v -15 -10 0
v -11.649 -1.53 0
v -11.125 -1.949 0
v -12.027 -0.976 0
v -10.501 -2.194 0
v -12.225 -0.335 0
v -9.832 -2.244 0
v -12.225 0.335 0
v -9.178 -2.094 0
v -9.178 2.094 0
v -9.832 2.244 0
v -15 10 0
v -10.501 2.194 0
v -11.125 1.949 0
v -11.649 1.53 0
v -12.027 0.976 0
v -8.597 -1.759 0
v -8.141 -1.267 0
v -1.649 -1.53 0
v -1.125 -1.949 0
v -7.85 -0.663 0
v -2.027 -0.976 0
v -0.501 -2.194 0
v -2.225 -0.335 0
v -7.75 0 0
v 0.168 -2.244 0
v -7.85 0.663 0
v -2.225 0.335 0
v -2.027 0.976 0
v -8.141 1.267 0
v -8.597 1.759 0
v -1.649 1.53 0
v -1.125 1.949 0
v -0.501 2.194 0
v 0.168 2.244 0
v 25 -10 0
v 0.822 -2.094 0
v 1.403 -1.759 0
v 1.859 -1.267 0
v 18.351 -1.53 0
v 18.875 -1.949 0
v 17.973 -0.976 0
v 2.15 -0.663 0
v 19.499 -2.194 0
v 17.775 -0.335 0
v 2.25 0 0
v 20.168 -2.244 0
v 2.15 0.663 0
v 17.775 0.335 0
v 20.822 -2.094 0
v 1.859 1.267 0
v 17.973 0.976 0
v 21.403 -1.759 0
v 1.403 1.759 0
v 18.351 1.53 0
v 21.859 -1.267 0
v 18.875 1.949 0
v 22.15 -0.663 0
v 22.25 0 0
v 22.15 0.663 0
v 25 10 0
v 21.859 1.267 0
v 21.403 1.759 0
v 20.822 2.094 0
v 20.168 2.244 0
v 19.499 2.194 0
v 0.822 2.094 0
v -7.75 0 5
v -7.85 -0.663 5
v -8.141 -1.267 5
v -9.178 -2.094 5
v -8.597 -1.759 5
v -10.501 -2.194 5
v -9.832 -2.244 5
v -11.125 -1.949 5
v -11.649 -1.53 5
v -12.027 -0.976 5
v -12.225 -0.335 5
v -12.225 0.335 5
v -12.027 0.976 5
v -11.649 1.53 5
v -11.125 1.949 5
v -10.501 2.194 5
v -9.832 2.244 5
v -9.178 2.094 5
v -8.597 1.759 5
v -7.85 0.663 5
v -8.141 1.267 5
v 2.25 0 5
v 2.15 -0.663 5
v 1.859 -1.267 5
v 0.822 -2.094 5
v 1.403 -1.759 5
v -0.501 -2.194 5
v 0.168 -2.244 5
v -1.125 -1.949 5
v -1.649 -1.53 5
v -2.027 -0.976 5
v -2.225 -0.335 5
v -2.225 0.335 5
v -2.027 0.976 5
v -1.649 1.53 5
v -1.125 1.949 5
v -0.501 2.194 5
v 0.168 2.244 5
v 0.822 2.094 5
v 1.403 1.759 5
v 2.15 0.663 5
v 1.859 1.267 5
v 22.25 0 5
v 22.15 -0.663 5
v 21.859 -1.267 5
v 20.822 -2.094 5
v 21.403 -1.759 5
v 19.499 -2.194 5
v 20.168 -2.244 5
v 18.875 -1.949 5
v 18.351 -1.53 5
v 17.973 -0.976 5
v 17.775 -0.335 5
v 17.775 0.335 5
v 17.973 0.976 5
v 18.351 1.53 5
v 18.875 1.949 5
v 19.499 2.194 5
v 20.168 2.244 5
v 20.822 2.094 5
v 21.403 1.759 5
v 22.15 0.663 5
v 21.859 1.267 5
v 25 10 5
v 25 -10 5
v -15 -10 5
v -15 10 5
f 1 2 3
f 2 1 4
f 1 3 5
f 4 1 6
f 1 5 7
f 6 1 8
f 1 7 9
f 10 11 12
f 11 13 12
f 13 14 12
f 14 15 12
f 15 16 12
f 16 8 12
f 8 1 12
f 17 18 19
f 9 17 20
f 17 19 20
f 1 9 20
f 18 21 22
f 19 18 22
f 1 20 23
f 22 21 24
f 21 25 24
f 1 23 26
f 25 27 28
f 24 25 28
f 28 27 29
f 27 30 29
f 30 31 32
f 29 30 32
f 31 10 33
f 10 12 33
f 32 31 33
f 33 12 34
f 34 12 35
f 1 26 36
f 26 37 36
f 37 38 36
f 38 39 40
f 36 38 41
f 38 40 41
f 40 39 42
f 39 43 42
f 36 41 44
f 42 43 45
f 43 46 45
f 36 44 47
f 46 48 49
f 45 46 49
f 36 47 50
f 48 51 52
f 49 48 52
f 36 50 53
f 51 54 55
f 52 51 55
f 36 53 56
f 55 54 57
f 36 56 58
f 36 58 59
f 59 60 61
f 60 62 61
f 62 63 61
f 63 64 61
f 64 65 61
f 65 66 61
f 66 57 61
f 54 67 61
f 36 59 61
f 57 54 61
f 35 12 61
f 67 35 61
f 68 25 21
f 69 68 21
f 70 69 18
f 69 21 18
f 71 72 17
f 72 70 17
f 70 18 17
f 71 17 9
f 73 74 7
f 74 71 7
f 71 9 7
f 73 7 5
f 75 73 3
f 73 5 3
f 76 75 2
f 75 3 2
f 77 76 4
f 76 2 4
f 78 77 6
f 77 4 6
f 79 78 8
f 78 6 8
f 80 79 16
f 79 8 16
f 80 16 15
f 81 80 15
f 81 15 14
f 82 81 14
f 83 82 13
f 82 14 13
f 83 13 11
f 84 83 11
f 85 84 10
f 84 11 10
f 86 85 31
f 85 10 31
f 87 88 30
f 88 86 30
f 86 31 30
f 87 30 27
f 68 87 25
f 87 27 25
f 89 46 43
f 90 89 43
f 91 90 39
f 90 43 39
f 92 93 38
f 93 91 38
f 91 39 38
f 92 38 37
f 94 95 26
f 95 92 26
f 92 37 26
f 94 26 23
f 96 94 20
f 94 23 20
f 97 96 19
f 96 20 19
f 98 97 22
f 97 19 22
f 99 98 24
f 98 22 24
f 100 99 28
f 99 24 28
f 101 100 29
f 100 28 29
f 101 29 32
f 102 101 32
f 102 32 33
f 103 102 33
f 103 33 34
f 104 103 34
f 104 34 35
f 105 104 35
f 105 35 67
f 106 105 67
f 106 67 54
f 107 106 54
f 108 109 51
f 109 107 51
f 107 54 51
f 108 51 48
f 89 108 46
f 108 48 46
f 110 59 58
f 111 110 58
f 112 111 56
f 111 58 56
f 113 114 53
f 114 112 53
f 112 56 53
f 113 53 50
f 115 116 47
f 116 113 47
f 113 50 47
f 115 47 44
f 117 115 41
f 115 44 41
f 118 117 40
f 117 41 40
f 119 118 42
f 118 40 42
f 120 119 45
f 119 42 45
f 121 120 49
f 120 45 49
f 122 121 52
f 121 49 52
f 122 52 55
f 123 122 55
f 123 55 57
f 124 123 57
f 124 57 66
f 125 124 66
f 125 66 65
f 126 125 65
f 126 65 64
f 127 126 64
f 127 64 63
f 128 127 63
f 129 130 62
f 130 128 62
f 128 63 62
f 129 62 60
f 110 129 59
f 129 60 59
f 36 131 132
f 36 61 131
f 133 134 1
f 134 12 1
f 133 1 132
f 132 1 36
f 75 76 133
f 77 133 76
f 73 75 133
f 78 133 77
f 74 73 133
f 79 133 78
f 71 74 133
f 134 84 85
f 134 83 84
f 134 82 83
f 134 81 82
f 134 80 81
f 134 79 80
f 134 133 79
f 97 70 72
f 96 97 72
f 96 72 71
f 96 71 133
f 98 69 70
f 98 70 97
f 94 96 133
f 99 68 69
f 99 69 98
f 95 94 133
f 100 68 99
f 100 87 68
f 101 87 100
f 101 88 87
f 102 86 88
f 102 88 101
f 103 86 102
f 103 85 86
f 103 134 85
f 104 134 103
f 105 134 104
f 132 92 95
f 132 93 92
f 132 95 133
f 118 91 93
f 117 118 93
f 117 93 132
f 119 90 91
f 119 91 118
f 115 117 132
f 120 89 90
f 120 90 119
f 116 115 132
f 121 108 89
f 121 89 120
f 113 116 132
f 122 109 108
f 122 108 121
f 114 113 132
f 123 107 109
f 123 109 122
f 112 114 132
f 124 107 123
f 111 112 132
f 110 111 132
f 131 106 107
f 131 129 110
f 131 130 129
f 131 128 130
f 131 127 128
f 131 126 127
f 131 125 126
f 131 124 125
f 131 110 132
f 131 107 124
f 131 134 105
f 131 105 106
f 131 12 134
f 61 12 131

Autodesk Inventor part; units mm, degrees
ref_plane "YZ Plane" through (0, 0, 0) normal (1, 0, 0) x (0, 1, 0)
ref_plane "XZ Plane" through (0, 0, 0) normal (0, 1, 0) x (-1, 0, 0)
ref_plane "XY Plane" through (0, 0, 0) normal (0, 0, 1) x (1, 0, 0)
sketch "Sketch1" plane through (0, 0, 0) normal (0, 0, 1) x (1, 0, 0)
  circle A0 centre (0, 0) radius 2.25
  circle A1 centre (-10, 0) radius 2.25
  line L0 (-10, 0) -> (0, 0) construction
  line L1 (-15, 10) -> (-15, -10)
  line L2 (-15, -10) -> (25, -10)
  line L3 (-10, 0) -> (-15, 0) construction
  line L4 (-15, 10) -> (25, 10)
  circle A2 centre (20, 0) radius 2.25
  line L5 (20, 0) -> (0, 0) construction
  line L6 (20, 0) -> (25, 0) construction
  line L7 (25, 10) -> (25, -10)
  dimension "d0" = 4.5
  dimension "d1" = 10
  dimension "d2" = 5
  dimension "d3" = 20
  dimension "d4" = 4.5
  dimension "d5" = 20
  dimension "d6" = 5
extrude "Extrusion1" add sketch "Sketch1" along normal blind 5
properties part number "Y Bearing Tensioner"
